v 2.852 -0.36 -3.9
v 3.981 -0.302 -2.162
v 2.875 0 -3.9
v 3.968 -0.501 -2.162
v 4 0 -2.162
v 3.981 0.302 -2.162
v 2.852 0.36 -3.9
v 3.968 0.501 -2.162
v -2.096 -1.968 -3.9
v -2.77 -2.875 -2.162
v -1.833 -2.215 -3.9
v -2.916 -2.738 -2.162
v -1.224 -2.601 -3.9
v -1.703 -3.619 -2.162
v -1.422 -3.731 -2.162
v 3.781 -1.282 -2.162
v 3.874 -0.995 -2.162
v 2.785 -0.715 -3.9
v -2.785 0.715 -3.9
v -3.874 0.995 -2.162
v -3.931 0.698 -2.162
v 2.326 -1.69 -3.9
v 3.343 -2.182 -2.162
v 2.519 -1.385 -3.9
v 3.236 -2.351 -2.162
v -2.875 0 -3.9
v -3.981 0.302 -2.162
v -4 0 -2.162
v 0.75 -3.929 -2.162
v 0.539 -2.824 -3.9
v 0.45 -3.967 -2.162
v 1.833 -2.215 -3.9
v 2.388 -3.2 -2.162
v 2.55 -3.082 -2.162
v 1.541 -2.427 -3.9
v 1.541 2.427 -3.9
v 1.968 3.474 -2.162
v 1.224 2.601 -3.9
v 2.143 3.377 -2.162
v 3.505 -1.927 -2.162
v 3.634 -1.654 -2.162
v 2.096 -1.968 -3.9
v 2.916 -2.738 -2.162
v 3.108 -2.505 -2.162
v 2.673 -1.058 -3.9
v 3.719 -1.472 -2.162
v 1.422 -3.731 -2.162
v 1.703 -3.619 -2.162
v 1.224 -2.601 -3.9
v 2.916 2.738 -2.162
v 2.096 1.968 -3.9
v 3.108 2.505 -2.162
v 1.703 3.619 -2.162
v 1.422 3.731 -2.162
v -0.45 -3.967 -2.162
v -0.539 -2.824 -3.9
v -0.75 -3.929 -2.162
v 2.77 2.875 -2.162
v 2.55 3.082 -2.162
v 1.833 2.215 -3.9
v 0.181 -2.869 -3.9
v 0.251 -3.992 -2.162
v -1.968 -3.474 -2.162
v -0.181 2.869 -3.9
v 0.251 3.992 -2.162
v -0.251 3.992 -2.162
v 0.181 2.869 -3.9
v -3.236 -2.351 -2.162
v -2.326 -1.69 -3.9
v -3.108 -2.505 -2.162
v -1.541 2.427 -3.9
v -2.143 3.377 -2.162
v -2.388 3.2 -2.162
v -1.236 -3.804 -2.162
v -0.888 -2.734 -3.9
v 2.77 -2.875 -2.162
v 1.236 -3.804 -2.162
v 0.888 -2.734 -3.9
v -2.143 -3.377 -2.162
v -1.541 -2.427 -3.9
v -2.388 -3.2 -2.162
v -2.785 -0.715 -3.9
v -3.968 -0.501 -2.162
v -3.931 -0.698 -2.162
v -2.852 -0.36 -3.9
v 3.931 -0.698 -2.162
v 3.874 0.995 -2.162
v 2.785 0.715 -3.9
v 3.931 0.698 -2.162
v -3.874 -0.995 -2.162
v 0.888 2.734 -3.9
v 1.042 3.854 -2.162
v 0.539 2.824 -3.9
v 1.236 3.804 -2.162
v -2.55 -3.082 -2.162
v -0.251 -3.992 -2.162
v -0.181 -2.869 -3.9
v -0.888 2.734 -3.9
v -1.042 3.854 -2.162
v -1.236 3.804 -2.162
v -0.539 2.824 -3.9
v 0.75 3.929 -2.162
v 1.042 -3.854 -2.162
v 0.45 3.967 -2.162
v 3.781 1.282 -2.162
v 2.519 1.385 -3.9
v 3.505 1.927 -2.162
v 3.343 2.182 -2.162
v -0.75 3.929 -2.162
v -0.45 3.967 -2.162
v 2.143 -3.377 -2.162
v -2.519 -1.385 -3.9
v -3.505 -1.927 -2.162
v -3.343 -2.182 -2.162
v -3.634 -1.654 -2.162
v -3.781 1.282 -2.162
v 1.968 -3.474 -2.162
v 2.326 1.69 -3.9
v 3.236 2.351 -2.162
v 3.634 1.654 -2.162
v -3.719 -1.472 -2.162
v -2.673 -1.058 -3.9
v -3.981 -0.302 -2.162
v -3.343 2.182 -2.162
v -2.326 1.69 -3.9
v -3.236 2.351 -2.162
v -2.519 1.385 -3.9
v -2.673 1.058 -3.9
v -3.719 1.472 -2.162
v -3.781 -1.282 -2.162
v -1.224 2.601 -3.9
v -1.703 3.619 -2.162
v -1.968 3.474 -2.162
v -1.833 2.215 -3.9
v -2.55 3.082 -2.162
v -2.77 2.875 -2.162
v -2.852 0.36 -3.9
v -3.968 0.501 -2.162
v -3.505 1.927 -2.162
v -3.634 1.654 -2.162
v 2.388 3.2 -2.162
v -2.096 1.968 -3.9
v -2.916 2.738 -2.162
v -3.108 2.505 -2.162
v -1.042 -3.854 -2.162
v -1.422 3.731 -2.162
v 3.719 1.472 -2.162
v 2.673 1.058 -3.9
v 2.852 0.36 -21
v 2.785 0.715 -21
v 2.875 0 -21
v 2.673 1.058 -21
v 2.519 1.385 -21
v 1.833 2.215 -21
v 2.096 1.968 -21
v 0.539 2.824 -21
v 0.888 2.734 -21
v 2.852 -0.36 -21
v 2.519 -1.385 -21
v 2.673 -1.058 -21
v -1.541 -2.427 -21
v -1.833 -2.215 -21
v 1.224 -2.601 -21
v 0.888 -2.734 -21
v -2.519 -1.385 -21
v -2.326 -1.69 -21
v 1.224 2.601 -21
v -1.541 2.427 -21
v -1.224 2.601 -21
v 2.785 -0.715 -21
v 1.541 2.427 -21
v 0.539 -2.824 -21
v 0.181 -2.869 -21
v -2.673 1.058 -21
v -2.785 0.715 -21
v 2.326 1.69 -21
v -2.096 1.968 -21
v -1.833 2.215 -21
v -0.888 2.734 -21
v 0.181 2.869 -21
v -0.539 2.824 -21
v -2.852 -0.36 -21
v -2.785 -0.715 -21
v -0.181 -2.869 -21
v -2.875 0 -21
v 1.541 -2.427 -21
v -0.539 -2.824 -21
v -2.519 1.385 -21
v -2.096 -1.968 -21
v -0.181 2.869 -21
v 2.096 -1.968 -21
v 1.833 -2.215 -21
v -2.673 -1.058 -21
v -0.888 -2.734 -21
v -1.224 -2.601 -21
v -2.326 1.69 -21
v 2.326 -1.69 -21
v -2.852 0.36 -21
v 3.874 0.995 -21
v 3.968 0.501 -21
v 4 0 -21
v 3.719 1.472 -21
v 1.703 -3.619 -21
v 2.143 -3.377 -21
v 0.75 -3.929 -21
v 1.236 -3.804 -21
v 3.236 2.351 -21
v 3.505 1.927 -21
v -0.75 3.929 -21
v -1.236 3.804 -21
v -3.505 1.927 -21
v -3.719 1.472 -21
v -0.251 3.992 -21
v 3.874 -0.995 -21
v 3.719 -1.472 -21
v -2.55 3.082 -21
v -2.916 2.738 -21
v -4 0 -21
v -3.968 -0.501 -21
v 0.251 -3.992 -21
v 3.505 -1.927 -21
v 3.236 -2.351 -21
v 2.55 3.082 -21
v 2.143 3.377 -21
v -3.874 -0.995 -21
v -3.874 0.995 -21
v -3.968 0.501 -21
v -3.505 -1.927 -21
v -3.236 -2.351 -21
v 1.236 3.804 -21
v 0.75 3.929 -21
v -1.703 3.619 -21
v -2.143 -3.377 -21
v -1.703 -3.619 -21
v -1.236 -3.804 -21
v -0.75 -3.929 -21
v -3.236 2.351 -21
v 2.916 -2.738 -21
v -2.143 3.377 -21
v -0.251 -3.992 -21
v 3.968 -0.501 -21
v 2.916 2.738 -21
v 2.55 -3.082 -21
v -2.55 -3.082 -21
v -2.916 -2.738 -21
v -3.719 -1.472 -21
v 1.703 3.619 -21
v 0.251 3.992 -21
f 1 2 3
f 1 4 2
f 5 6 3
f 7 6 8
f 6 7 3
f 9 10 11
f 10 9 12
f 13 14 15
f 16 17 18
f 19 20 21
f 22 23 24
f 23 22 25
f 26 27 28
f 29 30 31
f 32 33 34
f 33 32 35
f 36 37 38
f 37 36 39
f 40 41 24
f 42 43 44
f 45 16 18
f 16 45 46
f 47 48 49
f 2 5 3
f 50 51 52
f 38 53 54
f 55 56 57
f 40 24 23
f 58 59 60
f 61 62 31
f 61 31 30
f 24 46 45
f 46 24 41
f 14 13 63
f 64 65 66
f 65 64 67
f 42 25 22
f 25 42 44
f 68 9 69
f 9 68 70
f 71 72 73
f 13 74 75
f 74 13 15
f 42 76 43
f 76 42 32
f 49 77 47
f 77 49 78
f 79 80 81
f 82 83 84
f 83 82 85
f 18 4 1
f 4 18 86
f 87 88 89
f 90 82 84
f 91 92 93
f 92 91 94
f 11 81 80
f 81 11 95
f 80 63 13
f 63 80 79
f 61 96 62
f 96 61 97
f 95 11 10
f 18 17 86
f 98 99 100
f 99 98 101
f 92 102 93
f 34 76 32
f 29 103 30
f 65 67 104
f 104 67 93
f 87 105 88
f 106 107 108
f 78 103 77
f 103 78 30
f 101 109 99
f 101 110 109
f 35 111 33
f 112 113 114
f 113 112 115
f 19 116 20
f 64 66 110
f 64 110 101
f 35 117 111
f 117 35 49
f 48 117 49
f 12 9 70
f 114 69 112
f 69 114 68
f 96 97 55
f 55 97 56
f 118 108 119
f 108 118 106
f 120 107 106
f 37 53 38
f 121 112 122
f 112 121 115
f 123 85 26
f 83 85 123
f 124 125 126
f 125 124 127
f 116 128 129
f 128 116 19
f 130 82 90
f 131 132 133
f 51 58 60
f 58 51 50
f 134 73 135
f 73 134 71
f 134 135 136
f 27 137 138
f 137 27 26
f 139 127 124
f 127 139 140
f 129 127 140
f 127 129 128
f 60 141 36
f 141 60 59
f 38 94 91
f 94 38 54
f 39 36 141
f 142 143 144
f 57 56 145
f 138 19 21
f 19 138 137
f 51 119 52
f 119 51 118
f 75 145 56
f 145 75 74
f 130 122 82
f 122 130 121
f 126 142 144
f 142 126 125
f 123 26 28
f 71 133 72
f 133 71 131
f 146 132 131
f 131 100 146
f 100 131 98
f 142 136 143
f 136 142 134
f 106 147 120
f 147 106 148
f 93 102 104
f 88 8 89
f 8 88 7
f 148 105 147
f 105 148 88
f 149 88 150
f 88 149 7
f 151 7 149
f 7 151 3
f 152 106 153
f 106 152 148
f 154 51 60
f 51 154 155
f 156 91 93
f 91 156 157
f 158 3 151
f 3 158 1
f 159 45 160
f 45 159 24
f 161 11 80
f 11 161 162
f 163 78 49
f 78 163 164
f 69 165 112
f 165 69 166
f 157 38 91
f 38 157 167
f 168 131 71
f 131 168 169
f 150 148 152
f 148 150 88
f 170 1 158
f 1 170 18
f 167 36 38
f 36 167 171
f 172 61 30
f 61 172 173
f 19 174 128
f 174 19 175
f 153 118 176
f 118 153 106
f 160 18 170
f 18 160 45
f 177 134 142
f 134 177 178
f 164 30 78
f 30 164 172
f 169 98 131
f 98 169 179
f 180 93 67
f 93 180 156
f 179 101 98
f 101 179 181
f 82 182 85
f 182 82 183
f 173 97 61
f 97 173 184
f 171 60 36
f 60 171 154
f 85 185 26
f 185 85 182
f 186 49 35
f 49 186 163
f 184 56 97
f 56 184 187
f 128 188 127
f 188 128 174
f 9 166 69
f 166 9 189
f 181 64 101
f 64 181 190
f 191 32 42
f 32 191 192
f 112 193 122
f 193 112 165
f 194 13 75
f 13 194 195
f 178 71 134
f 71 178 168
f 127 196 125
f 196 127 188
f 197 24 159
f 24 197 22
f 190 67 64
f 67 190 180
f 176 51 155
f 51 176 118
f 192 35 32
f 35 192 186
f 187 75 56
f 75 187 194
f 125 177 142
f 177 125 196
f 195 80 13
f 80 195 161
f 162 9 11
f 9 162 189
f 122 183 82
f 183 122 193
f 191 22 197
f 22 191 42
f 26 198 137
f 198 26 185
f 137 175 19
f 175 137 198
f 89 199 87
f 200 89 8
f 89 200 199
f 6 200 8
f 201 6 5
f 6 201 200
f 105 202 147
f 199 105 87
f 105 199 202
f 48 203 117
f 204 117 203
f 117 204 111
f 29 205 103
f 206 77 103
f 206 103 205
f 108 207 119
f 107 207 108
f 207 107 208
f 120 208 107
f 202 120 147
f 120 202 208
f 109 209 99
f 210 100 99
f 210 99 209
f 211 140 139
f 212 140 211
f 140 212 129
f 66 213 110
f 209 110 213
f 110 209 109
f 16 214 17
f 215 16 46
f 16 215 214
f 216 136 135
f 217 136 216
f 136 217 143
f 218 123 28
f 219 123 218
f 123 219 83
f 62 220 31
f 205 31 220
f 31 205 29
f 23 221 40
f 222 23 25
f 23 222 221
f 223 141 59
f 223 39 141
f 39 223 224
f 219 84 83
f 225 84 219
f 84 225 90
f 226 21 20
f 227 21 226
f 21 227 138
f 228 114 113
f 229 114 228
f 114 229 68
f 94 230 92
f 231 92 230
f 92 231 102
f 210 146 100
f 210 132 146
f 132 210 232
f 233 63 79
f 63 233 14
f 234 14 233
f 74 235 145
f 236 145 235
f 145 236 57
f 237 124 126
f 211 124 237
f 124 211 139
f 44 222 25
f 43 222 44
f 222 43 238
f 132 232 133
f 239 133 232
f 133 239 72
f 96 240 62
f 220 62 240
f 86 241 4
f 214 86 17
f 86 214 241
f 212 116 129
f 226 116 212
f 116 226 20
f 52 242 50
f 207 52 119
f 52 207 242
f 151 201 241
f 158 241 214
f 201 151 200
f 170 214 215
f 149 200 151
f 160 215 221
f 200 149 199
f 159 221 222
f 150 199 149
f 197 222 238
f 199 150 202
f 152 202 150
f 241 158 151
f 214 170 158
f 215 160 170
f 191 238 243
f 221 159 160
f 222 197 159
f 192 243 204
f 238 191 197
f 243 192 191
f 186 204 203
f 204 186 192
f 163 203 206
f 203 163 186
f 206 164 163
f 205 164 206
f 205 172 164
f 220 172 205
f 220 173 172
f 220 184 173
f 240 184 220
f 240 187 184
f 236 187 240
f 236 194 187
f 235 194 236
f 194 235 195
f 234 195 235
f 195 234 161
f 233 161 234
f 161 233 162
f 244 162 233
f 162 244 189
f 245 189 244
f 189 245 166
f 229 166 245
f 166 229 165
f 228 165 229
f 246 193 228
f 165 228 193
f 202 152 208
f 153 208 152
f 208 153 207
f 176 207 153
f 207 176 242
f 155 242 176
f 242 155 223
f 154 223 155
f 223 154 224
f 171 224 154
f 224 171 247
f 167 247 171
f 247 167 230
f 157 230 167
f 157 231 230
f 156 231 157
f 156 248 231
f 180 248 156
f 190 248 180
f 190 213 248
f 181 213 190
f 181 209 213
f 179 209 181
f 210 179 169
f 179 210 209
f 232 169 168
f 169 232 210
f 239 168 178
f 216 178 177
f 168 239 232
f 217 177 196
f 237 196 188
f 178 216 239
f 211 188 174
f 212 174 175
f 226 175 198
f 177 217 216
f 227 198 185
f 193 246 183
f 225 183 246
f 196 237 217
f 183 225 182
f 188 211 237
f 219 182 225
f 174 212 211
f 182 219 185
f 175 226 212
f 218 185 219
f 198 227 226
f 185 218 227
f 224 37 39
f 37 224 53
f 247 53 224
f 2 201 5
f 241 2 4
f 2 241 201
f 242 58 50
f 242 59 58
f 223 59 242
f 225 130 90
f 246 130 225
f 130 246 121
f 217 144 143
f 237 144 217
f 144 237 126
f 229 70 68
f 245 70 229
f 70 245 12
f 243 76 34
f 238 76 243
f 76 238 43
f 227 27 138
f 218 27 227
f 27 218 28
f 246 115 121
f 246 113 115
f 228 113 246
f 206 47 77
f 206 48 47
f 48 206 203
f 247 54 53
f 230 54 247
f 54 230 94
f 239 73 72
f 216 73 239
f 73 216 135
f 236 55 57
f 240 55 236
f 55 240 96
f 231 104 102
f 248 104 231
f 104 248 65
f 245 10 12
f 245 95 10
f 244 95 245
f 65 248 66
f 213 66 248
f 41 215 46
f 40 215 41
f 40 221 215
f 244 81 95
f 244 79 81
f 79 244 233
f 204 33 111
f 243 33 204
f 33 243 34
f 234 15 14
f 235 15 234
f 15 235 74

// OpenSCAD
$fn = 50;

difference() {
	union() {
		translate(v = [0, 0, -21.0]) {
			cylinder(h = 24, r = 4.0);
		}
	}
	union() {
		translate(v = [0, 0, 0]) {
			rotate(a = [0, 0, 0]) {
				difference() {
					union() {
						translate(v = [0, 0, -24.0]) {
							cylinder(h = 24, r = 2.6);
						}
						translate(v = [0, 0, -3.9]) {
							cylinder(h = 3.9, r1 = 2.875, r2 = 5.4);
						}
						translate(v = [0, 0, -24.0]) {
							cylinder(h = 24, r = 2.875);
						}
						translate(v = [0, 0, -24.0]) {
							cylinder(h = 24, r = 2.6);
						}
					}
					union();
				}
			}
		}
		#cylinder(h = 3, r = 5.0);
	}
}
